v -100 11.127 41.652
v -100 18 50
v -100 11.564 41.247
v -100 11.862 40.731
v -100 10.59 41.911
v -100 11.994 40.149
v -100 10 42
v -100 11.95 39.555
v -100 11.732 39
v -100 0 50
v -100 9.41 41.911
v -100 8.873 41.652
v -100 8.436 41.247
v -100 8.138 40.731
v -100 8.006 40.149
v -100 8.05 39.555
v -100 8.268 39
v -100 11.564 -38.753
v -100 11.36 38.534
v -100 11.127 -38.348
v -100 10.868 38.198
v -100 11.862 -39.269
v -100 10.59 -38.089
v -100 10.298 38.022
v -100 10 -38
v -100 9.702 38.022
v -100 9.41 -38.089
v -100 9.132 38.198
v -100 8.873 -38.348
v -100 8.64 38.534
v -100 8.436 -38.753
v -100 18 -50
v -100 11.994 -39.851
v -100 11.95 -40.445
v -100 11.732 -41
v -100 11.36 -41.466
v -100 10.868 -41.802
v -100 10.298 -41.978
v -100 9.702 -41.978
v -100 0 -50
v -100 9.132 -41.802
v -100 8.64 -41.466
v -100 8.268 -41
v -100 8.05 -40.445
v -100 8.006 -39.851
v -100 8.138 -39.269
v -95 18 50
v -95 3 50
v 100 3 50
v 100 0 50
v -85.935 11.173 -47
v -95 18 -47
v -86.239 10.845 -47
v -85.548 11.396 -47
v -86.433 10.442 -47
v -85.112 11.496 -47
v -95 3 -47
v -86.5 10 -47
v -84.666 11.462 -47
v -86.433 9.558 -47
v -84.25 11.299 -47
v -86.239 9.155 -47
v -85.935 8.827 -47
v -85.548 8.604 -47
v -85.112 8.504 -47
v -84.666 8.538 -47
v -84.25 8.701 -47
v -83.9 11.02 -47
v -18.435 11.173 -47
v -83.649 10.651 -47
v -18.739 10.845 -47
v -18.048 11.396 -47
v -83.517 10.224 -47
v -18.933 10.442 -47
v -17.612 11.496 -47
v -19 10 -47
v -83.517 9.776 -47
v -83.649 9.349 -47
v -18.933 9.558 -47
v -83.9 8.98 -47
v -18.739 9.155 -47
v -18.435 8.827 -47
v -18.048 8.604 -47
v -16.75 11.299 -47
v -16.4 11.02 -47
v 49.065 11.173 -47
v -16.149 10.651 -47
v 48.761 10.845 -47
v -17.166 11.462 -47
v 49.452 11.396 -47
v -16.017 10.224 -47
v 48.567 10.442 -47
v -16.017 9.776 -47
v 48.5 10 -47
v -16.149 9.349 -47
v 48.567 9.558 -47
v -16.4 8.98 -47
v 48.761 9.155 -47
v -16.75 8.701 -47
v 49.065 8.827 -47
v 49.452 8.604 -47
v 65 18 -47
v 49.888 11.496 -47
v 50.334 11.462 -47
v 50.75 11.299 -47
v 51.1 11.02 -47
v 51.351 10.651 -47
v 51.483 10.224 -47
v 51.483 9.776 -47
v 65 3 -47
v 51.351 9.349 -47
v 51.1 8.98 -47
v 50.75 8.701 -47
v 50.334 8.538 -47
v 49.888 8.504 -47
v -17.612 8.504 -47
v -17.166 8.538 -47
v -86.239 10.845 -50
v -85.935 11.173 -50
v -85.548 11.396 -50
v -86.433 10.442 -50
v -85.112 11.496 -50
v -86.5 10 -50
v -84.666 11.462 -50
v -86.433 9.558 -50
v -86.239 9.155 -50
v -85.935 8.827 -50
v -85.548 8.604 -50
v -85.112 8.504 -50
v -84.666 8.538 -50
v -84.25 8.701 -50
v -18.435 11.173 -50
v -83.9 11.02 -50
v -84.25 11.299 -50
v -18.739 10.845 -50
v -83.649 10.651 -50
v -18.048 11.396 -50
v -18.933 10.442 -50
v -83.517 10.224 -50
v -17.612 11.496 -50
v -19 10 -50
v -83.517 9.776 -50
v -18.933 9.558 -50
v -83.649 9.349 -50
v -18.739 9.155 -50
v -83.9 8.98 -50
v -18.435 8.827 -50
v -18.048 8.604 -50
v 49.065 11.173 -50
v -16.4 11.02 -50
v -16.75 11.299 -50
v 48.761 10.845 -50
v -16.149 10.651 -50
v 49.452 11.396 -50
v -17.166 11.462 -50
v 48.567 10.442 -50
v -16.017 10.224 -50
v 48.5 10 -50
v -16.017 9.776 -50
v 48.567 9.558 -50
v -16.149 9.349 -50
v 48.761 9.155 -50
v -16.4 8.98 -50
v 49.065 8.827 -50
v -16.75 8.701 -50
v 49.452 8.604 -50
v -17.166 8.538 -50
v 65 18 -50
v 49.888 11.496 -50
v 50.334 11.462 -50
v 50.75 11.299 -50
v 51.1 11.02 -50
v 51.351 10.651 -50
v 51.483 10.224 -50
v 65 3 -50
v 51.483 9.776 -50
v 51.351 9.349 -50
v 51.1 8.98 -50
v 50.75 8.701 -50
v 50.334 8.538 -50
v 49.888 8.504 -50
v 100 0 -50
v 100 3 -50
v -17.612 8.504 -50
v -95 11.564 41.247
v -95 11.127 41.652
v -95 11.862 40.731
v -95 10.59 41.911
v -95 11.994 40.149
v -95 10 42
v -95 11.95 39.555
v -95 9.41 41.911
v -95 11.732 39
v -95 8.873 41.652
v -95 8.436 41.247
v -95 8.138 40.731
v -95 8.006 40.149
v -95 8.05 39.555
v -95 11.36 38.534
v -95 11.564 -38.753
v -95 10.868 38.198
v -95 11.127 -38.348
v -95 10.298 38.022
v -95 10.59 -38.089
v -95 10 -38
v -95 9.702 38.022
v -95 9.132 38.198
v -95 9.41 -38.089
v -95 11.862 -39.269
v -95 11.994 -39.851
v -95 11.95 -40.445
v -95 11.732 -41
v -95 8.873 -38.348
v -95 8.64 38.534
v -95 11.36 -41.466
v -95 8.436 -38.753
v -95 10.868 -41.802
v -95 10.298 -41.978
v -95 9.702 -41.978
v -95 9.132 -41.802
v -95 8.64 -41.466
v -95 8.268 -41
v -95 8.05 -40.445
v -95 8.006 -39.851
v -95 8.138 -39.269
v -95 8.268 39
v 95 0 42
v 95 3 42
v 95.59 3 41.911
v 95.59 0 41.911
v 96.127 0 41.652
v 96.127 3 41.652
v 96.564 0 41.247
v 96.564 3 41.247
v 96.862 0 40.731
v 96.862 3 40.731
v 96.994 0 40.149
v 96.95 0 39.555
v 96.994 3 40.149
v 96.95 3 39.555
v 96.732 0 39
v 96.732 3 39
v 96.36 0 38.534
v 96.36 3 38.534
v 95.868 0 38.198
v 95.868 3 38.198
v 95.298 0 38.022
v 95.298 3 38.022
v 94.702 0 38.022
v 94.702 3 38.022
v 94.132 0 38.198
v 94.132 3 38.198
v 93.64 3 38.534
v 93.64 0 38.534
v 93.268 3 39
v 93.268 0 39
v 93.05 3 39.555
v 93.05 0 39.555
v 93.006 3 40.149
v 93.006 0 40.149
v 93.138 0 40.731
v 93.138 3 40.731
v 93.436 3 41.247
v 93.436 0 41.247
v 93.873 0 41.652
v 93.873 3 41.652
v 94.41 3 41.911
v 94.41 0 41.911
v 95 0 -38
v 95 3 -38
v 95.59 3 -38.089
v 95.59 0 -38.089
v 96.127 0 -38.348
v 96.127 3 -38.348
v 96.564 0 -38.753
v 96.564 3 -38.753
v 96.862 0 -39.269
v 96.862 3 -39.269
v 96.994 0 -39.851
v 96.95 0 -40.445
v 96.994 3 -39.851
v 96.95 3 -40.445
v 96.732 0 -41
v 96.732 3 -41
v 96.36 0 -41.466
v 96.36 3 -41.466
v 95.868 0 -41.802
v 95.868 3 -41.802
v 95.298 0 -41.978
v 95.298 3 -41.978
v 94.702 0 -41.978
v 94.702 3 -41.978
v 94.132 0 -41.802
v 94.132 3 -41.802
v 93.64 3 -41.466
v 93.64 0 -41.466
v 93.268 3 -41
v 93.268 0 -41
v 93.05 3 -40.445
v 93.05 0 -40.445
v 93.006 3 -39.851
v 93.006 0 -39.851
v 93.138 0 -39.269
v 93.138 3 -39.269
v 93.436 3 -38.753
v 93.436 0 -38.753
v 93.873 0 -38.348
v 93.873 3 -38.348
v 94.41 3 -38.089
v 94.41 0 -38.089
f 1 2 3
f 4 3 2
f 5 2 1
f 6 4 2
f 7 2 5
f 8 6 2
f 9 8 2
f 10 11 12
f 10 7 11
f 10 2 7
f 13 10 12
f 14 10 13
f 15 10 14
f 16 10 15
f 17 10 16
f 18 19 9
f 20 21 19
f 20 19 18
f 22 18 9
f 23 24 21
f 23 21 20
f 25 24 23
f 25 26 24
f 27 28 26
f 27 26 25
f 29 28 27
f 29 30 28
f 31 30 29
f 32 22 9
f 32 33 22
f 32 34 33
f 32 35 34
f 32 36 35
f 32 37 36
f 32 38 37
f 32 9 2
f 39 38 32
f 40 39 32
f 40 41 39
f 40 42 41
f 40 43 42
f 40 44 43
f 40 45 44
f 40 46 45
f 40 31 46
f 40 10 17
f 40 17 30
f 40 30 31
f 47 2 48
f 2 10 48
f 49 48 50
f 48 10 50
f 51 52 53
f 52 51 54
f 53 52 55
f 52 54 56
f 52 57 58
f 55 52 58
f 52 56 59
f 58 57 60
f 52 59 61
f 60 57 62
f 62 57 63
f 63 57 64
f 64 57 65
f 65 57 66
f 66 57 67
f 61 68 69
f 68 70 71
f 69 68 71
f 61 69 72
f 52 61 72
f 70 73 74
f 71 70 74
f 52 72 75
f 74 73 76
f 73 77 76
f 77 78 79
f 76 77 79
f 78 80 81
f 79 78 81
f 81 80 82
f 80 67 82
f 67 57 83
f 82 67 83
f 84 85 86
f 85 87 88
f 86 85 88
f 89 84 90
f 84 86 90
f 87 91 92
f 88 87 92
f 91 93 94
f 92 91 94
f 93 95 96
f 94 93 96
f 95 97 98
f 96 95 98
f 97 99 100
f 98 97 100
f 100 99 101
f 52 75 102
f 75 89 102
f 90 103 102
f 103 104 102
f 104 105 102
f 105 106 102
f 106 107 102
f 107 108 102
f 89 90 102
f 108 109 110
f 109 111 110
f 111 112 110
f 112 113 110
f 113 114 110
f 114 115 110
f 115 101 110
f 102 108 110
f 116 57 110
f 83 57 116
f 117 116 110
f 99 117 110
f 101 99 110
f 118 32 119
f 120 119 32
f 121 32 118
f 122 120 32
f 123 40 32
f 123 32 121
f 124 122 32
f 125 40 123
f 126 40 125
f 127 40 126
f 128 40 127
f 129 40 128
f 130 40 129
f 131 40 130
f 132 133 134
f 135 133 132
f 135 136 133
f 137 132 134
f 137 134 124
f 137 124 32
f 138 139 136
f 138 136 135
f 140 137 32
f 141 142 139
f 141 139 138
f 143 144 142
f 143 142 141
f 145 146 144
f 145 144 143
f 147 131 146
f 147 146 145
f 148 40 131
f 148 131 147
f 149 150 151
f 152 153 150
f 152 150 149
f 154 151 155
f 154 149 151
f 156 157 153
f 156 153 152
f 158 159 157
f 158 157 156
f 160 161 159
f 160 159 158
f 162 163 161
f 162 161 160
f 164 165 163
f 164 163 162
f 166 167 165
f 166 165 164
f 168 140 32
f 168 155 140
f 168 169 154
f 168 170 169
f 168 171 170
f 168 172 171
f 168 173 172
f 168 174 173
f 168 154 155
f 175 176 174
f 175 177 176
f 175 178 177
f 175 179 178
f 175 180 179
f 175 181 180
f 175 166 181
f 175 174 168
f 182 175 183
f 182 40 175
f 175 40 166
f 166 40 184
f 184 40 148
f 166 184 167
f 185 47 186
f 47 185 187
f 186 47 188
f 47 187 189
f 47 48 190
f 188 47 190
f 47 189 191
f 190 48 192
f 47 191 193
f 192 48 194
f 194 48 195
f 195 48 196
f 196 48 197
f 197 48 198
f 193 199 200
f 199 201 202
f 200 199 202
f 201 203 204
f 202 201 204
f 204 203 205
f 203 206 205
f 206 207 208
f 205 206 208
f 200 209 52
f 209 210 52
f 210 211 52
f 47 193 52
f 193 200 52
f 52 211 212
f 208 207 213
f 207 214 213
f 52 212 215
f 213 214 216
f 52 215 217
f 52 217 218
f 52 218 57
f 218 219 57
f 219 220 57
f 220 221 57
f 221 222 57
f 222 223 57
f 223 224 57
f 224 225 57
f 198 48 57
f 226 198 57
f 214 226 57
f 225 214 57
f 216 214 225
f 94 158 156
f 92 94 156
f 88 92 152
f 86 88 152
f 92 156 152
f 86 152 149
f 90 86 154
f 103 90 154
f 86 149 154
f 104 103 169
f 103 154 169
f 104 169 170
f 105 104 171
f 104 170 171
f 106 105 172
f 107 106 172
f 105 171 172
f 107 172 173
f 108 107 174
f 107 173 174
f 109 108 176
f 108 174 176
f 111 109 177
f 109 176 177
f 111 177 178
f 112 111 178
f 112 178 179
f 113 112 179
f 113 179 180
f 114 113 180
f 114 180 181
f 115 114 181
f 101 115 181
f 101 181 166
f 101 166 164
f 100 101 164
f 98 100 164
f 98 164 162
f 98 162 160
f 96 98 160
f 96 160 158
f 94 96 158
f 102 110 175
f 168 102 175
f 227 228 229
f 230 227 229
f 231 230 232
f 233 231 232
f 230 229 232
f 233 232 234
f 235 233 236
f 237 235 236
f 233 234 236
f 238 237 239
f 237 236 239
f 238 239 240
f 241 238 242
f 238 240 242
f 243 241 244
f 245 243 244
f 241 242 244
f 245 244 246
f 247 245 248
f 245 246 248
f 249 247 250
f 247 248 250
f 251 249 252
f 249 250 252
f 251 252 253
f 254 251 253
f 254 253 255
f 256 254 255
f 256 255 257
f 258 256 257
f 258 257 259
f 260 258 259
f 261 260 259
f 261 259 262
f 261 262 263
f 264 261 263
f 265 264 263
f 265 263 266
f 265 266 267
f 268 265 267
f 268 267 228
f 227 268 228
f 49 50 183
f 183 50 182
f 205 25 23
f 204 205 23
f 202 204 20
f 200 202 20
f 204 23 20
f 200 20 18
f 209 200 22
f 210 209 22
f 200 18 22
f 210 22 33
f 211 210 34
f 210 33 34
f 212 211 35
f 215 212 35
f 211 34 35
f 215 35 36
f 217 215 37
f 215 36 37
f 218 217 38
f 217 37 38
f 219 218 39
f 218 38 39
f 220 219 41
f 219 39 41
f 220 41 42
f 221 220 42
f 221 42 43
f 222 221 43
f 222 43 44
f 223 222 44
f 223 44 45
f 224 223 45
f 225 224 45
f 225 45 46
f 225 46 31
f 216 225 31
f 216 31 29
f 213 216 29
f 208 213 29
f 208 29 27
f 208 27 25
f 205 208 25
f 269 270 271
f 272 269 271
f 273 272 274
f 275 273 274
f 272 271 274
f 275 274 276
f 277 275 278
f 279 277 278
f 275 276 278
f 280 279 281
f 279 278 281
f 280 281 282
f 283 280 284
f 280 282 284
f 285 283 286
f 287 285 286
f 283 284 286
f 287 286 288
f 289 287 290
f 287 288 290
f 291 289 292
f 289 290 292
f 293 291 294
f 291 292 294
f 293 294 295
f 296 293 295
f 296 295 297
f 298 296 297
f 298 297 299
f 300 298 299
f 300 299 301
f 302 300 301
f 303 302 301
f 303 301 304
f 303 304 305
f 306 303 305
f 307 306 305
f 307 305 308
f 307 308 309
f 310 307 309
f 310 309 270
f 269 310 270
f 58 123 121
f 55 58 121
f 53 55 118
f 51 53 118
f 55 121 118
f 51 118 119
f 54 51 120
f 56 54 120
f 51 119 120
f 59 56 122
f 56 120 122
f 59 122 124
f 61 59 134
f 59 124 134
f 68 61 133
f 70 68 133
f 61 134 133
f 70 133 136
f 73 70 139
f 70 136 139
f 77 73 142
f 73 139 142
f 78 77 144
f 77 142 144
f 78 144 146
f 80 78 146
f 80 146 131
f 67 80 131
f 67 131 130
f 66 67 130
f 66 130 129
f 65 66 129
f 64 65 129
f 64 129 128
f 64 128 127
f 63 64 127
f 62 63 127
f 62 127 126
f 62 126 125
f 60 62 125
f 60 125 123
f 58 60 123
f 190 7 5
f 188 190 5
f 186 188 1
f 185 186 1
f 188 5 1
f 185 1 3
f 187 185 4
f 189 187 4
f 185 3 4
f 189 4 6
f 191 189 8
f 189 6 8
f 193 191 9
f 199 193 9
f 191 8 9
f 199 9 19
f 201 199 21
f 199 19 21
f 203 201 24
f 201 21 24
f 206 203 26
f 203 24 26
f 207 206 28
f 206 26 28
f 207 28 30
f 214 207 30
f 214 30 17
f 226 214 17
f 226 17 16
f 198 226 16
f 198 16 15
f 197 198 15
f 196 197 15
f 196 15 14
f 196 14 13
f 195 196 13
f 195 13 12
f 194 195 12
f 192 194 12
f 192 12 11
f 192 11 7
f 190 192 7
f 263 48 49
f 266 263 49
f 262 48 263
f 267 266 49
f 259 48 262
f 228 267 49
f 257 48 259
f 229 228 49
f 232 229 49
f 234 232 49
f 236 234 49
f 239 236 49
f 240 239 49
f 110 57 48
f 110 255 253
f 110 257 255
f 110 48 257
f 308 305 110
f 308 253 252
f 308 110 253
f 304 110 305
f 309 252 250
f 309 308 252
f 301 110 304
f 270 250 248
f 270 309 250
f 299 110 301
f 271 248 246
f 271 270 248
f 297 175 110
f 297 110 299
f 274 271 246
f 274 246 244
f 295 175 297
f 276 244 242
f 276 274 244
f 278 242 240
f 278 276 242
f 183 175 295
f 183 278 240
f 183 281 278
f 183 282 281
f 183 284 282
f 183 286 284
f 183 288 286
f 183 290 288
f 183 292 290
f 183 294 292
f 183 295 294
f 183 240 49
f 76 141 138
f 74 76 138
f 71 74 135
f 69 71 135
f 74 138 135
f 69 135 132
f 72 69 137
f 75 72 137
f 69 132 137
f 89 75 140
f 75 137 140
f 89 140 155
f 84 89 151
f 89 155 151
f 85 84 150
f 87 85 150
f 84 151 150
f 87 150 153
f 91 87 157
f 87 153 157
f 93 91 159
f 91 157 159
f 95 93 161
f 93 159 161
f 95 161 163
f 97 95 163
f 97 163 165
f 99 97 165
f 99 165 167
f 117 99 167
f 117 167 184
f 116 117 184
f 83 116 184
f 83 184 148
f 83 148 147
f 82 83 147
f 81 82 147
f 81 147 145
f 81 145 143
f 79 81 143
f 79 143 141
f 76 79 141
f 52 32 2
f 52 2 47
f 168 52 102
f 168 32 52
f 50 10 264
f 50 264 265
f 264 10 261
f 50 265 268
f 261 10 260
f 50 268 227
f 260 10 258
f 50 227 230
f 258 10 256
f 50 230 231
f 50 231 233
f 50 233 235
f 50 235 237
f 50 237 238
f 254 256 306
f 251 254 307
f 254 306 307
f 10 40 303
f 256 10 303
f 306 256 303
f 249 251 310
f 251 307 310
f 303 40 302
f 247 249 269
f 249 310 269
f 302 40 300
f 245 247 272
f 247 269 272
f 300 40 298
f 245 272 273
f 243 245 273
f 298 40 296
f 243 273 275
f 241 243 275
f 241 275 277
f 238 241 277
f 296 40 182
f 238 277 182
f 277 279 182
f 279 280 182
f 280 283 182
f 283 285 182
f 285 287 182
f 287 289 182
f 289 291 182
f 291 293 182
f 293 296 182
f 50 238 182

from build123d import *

# Parameters (mm, degrees)
SKETCH1_W           = 200
SKETCH1_H           = 100
BOSS_EXTRUDE1_DEPTH = 3
SKETCH2_W           = 5
SKETCH2_H           = 100
BOSS_EXTRUDE2_DEPTH = 15
CUT_EXTRUDE1_REACH  = 208.94
SKETCH3_R           = 2
LPATTERN1_COUNT     = 2
LPATTERN1_PITCH     = 80
CUT_EXTRUDE2_REACH  = 114.805
SKETCH4_R           = 2
LPATTERN2_COUNT     = 2
LPATTERN2_PITCH     = 80
SKETCH5_W           = 160
SKETCH5_H           = 3
BOSS_EXTRUDE3_DEPTH = 15
CUT_EXTRUDE3_REACH  = 144.562
SKETCH6_R           = 1.5


with BuildPart() as part:
    # Sketch1 → Boss-Extrude1 (new body)
    with BuildSketch(Plane(origin=(0, 0, 0), x_dir=(1, 0, 0), z_dir=(0, 1, 0))):
        Rectangle(SKETCH1_W, SKETCH1_H)
    extrude(amount=BOSS_EXTRUDE1_DEPTH)

    # Sketch2 → Boss-Extrude2 (add)
    with BuildSketch(Plane(origin=(0, 3, 0), x_dir=(1, 0, 0), z_dir=(0, 1, 0))):
        with Locations((-97.5, 0)):
            Rectangle(SKETCH2_W, SKETCH2_H)
    extrude(amount=BOSS_EXTRUDE2_DEPTH)

    # Sketch3 → Cut-Extrude1 (cut, up to next)
    with BuildSketch(Plane.ZY.offset(100), mode=Mode.PRIVATE) as cut_extrude1_sk1:
        with Locations((40, 10)):
            Circle(SKETCH3_R)
    cut_extrude1_tool1 = extrude(cut_extrude1_sk1.sketch, amount=-CUT_EXTRUDE1_REACH, mode=Mode.PRIVATE) & part.part
    cut_extrude1 = cut_extrude1_tool1.solids().sort_by_distance((-100, 10, 40))[0]
    add(cut_extrude1, mode=Mode.SUBTRACT)

    # LPattern1: Cut-Extrude1 ×2
    with Locations(*[(0, 0, -i * LPATTERN1_PITCH) for i in range(1, LPATTERN1_COUNT)]):
        add(cut_extrude1, mode=Mode.SUBTRACT)

    # Sketch4 → Cut-Extrude2 (cut, up to next)
    with BuildSketch(Plane(origin=(0, 3, 0), x_dir=(1, 0, 0), z_dir=(0, 1, 0)), mode=Mode.PRIVATE) as cut_extrude2_sk1:
        with Locations(Location((95, 40, 0), (0, 0, 270))):
            Circle(SKETCH4_R)
    cut_extrude2_tool1 = extrude(cut_extrude2_sk1.sketch, amount=-CUT_EXTRUDE2_REACH, mode=Mode.PRIVATE) & part.part
    cut_extrude2 = cut_extrude2_tool1.solids().sort_by_distance((95, 3, -40))[0]
    add(cut_extrude2, mode=Mode.SUBTRACT)

    # LPattern2: Cut-Extrude2 ×2
    with Locations(*[(0, 0, i * LPATTERN2_PITCH) for i in range(1, LPATTERN2_COUNT)]):
        add(cut_extrude2, mode=Mode.SUBTRACT)

    # Sketch5 → Boss-Extrude3 (add)
    with BuildSketch(Plane(origin=(0, 3, 0), x_dir=(1, 0, 0), z_dir=(0, 1, 0))):
        with Locations((-15, 48.5)):
            Rectangle(SKETCH5_W, SKETCH5_H)
    extrude(amount=BOSS_EXTRUDE3_DEPTH)

    # Sketch6 → Cut-Extrude3 (cut, up to next)
    with BuildSketch(Plane(origin=(0, 0, -50), x_dir=(-1, 0, 0), z_dir=(0, 0, -1)), mode=Mode.PRIVATE) as cut_extrude3_sk1:
        with Locations((85, 10)):
            Circle(SKETCH6_R)
    cut_extrude3_tool1 = extrude(cut_extrude3_sk1.sketch, amount=-CUT_EXTRUDE3_REACH, mode=Mode.PRIVATE) & part.part
    # Sketch6 → Cut-Extrude3 (cut, up to next)
    with BuildSketch(Plane(origin=(0, 0, -50), x_dir=(-1, 0, 0), z_dir=(0, 0, -1)), mode=Mode.PRIVATE) as cut_extrude3_sk2:
        with Locations((17.5, 10)):
            Circle(SKETCH6_R)
    cut_extrude3_tool2 = extrude(cut_extrude3_sk2.sketch, amount=-CUT_EXTRUDE3_REACH, mode=Mode.PRIVATE) & part.part
    # Sketch6 → Cut-Extrude3 (cut, up to next)
    with BuildSketch(Plane(origin=(0, 0, -50), x_dir=(-1, 0, 0), z_dir=(0, 0, -1)), mode=Mode.PRIVATE) as cut_extrude3_sk3:
        with Locations((-50, 10)):
            Circle(SKETCH6_R)
    cut_extrude3_tool3 = extrude(cut_extrude3_sk3.sketch, amount=-CUT_EXTRUDE3_REACH, mode=Mode.PRIVATE) & part.part
    add(cut_extrude3_tool1.solids().sort_by_distance((-85, 10, -50))[0], mode=Mode.SUBTRACT)
    add(cut_extrude3_tool2.solids().sort_by_distance((-17.5, 10, -50))[0], mode=Mode.SUBTRACT)
    add(cut_extrude3_tool3.solids().sort_by_distance((50, 10, -50))[0], mode=Mode.SUBTRACT)


solid = part.part
